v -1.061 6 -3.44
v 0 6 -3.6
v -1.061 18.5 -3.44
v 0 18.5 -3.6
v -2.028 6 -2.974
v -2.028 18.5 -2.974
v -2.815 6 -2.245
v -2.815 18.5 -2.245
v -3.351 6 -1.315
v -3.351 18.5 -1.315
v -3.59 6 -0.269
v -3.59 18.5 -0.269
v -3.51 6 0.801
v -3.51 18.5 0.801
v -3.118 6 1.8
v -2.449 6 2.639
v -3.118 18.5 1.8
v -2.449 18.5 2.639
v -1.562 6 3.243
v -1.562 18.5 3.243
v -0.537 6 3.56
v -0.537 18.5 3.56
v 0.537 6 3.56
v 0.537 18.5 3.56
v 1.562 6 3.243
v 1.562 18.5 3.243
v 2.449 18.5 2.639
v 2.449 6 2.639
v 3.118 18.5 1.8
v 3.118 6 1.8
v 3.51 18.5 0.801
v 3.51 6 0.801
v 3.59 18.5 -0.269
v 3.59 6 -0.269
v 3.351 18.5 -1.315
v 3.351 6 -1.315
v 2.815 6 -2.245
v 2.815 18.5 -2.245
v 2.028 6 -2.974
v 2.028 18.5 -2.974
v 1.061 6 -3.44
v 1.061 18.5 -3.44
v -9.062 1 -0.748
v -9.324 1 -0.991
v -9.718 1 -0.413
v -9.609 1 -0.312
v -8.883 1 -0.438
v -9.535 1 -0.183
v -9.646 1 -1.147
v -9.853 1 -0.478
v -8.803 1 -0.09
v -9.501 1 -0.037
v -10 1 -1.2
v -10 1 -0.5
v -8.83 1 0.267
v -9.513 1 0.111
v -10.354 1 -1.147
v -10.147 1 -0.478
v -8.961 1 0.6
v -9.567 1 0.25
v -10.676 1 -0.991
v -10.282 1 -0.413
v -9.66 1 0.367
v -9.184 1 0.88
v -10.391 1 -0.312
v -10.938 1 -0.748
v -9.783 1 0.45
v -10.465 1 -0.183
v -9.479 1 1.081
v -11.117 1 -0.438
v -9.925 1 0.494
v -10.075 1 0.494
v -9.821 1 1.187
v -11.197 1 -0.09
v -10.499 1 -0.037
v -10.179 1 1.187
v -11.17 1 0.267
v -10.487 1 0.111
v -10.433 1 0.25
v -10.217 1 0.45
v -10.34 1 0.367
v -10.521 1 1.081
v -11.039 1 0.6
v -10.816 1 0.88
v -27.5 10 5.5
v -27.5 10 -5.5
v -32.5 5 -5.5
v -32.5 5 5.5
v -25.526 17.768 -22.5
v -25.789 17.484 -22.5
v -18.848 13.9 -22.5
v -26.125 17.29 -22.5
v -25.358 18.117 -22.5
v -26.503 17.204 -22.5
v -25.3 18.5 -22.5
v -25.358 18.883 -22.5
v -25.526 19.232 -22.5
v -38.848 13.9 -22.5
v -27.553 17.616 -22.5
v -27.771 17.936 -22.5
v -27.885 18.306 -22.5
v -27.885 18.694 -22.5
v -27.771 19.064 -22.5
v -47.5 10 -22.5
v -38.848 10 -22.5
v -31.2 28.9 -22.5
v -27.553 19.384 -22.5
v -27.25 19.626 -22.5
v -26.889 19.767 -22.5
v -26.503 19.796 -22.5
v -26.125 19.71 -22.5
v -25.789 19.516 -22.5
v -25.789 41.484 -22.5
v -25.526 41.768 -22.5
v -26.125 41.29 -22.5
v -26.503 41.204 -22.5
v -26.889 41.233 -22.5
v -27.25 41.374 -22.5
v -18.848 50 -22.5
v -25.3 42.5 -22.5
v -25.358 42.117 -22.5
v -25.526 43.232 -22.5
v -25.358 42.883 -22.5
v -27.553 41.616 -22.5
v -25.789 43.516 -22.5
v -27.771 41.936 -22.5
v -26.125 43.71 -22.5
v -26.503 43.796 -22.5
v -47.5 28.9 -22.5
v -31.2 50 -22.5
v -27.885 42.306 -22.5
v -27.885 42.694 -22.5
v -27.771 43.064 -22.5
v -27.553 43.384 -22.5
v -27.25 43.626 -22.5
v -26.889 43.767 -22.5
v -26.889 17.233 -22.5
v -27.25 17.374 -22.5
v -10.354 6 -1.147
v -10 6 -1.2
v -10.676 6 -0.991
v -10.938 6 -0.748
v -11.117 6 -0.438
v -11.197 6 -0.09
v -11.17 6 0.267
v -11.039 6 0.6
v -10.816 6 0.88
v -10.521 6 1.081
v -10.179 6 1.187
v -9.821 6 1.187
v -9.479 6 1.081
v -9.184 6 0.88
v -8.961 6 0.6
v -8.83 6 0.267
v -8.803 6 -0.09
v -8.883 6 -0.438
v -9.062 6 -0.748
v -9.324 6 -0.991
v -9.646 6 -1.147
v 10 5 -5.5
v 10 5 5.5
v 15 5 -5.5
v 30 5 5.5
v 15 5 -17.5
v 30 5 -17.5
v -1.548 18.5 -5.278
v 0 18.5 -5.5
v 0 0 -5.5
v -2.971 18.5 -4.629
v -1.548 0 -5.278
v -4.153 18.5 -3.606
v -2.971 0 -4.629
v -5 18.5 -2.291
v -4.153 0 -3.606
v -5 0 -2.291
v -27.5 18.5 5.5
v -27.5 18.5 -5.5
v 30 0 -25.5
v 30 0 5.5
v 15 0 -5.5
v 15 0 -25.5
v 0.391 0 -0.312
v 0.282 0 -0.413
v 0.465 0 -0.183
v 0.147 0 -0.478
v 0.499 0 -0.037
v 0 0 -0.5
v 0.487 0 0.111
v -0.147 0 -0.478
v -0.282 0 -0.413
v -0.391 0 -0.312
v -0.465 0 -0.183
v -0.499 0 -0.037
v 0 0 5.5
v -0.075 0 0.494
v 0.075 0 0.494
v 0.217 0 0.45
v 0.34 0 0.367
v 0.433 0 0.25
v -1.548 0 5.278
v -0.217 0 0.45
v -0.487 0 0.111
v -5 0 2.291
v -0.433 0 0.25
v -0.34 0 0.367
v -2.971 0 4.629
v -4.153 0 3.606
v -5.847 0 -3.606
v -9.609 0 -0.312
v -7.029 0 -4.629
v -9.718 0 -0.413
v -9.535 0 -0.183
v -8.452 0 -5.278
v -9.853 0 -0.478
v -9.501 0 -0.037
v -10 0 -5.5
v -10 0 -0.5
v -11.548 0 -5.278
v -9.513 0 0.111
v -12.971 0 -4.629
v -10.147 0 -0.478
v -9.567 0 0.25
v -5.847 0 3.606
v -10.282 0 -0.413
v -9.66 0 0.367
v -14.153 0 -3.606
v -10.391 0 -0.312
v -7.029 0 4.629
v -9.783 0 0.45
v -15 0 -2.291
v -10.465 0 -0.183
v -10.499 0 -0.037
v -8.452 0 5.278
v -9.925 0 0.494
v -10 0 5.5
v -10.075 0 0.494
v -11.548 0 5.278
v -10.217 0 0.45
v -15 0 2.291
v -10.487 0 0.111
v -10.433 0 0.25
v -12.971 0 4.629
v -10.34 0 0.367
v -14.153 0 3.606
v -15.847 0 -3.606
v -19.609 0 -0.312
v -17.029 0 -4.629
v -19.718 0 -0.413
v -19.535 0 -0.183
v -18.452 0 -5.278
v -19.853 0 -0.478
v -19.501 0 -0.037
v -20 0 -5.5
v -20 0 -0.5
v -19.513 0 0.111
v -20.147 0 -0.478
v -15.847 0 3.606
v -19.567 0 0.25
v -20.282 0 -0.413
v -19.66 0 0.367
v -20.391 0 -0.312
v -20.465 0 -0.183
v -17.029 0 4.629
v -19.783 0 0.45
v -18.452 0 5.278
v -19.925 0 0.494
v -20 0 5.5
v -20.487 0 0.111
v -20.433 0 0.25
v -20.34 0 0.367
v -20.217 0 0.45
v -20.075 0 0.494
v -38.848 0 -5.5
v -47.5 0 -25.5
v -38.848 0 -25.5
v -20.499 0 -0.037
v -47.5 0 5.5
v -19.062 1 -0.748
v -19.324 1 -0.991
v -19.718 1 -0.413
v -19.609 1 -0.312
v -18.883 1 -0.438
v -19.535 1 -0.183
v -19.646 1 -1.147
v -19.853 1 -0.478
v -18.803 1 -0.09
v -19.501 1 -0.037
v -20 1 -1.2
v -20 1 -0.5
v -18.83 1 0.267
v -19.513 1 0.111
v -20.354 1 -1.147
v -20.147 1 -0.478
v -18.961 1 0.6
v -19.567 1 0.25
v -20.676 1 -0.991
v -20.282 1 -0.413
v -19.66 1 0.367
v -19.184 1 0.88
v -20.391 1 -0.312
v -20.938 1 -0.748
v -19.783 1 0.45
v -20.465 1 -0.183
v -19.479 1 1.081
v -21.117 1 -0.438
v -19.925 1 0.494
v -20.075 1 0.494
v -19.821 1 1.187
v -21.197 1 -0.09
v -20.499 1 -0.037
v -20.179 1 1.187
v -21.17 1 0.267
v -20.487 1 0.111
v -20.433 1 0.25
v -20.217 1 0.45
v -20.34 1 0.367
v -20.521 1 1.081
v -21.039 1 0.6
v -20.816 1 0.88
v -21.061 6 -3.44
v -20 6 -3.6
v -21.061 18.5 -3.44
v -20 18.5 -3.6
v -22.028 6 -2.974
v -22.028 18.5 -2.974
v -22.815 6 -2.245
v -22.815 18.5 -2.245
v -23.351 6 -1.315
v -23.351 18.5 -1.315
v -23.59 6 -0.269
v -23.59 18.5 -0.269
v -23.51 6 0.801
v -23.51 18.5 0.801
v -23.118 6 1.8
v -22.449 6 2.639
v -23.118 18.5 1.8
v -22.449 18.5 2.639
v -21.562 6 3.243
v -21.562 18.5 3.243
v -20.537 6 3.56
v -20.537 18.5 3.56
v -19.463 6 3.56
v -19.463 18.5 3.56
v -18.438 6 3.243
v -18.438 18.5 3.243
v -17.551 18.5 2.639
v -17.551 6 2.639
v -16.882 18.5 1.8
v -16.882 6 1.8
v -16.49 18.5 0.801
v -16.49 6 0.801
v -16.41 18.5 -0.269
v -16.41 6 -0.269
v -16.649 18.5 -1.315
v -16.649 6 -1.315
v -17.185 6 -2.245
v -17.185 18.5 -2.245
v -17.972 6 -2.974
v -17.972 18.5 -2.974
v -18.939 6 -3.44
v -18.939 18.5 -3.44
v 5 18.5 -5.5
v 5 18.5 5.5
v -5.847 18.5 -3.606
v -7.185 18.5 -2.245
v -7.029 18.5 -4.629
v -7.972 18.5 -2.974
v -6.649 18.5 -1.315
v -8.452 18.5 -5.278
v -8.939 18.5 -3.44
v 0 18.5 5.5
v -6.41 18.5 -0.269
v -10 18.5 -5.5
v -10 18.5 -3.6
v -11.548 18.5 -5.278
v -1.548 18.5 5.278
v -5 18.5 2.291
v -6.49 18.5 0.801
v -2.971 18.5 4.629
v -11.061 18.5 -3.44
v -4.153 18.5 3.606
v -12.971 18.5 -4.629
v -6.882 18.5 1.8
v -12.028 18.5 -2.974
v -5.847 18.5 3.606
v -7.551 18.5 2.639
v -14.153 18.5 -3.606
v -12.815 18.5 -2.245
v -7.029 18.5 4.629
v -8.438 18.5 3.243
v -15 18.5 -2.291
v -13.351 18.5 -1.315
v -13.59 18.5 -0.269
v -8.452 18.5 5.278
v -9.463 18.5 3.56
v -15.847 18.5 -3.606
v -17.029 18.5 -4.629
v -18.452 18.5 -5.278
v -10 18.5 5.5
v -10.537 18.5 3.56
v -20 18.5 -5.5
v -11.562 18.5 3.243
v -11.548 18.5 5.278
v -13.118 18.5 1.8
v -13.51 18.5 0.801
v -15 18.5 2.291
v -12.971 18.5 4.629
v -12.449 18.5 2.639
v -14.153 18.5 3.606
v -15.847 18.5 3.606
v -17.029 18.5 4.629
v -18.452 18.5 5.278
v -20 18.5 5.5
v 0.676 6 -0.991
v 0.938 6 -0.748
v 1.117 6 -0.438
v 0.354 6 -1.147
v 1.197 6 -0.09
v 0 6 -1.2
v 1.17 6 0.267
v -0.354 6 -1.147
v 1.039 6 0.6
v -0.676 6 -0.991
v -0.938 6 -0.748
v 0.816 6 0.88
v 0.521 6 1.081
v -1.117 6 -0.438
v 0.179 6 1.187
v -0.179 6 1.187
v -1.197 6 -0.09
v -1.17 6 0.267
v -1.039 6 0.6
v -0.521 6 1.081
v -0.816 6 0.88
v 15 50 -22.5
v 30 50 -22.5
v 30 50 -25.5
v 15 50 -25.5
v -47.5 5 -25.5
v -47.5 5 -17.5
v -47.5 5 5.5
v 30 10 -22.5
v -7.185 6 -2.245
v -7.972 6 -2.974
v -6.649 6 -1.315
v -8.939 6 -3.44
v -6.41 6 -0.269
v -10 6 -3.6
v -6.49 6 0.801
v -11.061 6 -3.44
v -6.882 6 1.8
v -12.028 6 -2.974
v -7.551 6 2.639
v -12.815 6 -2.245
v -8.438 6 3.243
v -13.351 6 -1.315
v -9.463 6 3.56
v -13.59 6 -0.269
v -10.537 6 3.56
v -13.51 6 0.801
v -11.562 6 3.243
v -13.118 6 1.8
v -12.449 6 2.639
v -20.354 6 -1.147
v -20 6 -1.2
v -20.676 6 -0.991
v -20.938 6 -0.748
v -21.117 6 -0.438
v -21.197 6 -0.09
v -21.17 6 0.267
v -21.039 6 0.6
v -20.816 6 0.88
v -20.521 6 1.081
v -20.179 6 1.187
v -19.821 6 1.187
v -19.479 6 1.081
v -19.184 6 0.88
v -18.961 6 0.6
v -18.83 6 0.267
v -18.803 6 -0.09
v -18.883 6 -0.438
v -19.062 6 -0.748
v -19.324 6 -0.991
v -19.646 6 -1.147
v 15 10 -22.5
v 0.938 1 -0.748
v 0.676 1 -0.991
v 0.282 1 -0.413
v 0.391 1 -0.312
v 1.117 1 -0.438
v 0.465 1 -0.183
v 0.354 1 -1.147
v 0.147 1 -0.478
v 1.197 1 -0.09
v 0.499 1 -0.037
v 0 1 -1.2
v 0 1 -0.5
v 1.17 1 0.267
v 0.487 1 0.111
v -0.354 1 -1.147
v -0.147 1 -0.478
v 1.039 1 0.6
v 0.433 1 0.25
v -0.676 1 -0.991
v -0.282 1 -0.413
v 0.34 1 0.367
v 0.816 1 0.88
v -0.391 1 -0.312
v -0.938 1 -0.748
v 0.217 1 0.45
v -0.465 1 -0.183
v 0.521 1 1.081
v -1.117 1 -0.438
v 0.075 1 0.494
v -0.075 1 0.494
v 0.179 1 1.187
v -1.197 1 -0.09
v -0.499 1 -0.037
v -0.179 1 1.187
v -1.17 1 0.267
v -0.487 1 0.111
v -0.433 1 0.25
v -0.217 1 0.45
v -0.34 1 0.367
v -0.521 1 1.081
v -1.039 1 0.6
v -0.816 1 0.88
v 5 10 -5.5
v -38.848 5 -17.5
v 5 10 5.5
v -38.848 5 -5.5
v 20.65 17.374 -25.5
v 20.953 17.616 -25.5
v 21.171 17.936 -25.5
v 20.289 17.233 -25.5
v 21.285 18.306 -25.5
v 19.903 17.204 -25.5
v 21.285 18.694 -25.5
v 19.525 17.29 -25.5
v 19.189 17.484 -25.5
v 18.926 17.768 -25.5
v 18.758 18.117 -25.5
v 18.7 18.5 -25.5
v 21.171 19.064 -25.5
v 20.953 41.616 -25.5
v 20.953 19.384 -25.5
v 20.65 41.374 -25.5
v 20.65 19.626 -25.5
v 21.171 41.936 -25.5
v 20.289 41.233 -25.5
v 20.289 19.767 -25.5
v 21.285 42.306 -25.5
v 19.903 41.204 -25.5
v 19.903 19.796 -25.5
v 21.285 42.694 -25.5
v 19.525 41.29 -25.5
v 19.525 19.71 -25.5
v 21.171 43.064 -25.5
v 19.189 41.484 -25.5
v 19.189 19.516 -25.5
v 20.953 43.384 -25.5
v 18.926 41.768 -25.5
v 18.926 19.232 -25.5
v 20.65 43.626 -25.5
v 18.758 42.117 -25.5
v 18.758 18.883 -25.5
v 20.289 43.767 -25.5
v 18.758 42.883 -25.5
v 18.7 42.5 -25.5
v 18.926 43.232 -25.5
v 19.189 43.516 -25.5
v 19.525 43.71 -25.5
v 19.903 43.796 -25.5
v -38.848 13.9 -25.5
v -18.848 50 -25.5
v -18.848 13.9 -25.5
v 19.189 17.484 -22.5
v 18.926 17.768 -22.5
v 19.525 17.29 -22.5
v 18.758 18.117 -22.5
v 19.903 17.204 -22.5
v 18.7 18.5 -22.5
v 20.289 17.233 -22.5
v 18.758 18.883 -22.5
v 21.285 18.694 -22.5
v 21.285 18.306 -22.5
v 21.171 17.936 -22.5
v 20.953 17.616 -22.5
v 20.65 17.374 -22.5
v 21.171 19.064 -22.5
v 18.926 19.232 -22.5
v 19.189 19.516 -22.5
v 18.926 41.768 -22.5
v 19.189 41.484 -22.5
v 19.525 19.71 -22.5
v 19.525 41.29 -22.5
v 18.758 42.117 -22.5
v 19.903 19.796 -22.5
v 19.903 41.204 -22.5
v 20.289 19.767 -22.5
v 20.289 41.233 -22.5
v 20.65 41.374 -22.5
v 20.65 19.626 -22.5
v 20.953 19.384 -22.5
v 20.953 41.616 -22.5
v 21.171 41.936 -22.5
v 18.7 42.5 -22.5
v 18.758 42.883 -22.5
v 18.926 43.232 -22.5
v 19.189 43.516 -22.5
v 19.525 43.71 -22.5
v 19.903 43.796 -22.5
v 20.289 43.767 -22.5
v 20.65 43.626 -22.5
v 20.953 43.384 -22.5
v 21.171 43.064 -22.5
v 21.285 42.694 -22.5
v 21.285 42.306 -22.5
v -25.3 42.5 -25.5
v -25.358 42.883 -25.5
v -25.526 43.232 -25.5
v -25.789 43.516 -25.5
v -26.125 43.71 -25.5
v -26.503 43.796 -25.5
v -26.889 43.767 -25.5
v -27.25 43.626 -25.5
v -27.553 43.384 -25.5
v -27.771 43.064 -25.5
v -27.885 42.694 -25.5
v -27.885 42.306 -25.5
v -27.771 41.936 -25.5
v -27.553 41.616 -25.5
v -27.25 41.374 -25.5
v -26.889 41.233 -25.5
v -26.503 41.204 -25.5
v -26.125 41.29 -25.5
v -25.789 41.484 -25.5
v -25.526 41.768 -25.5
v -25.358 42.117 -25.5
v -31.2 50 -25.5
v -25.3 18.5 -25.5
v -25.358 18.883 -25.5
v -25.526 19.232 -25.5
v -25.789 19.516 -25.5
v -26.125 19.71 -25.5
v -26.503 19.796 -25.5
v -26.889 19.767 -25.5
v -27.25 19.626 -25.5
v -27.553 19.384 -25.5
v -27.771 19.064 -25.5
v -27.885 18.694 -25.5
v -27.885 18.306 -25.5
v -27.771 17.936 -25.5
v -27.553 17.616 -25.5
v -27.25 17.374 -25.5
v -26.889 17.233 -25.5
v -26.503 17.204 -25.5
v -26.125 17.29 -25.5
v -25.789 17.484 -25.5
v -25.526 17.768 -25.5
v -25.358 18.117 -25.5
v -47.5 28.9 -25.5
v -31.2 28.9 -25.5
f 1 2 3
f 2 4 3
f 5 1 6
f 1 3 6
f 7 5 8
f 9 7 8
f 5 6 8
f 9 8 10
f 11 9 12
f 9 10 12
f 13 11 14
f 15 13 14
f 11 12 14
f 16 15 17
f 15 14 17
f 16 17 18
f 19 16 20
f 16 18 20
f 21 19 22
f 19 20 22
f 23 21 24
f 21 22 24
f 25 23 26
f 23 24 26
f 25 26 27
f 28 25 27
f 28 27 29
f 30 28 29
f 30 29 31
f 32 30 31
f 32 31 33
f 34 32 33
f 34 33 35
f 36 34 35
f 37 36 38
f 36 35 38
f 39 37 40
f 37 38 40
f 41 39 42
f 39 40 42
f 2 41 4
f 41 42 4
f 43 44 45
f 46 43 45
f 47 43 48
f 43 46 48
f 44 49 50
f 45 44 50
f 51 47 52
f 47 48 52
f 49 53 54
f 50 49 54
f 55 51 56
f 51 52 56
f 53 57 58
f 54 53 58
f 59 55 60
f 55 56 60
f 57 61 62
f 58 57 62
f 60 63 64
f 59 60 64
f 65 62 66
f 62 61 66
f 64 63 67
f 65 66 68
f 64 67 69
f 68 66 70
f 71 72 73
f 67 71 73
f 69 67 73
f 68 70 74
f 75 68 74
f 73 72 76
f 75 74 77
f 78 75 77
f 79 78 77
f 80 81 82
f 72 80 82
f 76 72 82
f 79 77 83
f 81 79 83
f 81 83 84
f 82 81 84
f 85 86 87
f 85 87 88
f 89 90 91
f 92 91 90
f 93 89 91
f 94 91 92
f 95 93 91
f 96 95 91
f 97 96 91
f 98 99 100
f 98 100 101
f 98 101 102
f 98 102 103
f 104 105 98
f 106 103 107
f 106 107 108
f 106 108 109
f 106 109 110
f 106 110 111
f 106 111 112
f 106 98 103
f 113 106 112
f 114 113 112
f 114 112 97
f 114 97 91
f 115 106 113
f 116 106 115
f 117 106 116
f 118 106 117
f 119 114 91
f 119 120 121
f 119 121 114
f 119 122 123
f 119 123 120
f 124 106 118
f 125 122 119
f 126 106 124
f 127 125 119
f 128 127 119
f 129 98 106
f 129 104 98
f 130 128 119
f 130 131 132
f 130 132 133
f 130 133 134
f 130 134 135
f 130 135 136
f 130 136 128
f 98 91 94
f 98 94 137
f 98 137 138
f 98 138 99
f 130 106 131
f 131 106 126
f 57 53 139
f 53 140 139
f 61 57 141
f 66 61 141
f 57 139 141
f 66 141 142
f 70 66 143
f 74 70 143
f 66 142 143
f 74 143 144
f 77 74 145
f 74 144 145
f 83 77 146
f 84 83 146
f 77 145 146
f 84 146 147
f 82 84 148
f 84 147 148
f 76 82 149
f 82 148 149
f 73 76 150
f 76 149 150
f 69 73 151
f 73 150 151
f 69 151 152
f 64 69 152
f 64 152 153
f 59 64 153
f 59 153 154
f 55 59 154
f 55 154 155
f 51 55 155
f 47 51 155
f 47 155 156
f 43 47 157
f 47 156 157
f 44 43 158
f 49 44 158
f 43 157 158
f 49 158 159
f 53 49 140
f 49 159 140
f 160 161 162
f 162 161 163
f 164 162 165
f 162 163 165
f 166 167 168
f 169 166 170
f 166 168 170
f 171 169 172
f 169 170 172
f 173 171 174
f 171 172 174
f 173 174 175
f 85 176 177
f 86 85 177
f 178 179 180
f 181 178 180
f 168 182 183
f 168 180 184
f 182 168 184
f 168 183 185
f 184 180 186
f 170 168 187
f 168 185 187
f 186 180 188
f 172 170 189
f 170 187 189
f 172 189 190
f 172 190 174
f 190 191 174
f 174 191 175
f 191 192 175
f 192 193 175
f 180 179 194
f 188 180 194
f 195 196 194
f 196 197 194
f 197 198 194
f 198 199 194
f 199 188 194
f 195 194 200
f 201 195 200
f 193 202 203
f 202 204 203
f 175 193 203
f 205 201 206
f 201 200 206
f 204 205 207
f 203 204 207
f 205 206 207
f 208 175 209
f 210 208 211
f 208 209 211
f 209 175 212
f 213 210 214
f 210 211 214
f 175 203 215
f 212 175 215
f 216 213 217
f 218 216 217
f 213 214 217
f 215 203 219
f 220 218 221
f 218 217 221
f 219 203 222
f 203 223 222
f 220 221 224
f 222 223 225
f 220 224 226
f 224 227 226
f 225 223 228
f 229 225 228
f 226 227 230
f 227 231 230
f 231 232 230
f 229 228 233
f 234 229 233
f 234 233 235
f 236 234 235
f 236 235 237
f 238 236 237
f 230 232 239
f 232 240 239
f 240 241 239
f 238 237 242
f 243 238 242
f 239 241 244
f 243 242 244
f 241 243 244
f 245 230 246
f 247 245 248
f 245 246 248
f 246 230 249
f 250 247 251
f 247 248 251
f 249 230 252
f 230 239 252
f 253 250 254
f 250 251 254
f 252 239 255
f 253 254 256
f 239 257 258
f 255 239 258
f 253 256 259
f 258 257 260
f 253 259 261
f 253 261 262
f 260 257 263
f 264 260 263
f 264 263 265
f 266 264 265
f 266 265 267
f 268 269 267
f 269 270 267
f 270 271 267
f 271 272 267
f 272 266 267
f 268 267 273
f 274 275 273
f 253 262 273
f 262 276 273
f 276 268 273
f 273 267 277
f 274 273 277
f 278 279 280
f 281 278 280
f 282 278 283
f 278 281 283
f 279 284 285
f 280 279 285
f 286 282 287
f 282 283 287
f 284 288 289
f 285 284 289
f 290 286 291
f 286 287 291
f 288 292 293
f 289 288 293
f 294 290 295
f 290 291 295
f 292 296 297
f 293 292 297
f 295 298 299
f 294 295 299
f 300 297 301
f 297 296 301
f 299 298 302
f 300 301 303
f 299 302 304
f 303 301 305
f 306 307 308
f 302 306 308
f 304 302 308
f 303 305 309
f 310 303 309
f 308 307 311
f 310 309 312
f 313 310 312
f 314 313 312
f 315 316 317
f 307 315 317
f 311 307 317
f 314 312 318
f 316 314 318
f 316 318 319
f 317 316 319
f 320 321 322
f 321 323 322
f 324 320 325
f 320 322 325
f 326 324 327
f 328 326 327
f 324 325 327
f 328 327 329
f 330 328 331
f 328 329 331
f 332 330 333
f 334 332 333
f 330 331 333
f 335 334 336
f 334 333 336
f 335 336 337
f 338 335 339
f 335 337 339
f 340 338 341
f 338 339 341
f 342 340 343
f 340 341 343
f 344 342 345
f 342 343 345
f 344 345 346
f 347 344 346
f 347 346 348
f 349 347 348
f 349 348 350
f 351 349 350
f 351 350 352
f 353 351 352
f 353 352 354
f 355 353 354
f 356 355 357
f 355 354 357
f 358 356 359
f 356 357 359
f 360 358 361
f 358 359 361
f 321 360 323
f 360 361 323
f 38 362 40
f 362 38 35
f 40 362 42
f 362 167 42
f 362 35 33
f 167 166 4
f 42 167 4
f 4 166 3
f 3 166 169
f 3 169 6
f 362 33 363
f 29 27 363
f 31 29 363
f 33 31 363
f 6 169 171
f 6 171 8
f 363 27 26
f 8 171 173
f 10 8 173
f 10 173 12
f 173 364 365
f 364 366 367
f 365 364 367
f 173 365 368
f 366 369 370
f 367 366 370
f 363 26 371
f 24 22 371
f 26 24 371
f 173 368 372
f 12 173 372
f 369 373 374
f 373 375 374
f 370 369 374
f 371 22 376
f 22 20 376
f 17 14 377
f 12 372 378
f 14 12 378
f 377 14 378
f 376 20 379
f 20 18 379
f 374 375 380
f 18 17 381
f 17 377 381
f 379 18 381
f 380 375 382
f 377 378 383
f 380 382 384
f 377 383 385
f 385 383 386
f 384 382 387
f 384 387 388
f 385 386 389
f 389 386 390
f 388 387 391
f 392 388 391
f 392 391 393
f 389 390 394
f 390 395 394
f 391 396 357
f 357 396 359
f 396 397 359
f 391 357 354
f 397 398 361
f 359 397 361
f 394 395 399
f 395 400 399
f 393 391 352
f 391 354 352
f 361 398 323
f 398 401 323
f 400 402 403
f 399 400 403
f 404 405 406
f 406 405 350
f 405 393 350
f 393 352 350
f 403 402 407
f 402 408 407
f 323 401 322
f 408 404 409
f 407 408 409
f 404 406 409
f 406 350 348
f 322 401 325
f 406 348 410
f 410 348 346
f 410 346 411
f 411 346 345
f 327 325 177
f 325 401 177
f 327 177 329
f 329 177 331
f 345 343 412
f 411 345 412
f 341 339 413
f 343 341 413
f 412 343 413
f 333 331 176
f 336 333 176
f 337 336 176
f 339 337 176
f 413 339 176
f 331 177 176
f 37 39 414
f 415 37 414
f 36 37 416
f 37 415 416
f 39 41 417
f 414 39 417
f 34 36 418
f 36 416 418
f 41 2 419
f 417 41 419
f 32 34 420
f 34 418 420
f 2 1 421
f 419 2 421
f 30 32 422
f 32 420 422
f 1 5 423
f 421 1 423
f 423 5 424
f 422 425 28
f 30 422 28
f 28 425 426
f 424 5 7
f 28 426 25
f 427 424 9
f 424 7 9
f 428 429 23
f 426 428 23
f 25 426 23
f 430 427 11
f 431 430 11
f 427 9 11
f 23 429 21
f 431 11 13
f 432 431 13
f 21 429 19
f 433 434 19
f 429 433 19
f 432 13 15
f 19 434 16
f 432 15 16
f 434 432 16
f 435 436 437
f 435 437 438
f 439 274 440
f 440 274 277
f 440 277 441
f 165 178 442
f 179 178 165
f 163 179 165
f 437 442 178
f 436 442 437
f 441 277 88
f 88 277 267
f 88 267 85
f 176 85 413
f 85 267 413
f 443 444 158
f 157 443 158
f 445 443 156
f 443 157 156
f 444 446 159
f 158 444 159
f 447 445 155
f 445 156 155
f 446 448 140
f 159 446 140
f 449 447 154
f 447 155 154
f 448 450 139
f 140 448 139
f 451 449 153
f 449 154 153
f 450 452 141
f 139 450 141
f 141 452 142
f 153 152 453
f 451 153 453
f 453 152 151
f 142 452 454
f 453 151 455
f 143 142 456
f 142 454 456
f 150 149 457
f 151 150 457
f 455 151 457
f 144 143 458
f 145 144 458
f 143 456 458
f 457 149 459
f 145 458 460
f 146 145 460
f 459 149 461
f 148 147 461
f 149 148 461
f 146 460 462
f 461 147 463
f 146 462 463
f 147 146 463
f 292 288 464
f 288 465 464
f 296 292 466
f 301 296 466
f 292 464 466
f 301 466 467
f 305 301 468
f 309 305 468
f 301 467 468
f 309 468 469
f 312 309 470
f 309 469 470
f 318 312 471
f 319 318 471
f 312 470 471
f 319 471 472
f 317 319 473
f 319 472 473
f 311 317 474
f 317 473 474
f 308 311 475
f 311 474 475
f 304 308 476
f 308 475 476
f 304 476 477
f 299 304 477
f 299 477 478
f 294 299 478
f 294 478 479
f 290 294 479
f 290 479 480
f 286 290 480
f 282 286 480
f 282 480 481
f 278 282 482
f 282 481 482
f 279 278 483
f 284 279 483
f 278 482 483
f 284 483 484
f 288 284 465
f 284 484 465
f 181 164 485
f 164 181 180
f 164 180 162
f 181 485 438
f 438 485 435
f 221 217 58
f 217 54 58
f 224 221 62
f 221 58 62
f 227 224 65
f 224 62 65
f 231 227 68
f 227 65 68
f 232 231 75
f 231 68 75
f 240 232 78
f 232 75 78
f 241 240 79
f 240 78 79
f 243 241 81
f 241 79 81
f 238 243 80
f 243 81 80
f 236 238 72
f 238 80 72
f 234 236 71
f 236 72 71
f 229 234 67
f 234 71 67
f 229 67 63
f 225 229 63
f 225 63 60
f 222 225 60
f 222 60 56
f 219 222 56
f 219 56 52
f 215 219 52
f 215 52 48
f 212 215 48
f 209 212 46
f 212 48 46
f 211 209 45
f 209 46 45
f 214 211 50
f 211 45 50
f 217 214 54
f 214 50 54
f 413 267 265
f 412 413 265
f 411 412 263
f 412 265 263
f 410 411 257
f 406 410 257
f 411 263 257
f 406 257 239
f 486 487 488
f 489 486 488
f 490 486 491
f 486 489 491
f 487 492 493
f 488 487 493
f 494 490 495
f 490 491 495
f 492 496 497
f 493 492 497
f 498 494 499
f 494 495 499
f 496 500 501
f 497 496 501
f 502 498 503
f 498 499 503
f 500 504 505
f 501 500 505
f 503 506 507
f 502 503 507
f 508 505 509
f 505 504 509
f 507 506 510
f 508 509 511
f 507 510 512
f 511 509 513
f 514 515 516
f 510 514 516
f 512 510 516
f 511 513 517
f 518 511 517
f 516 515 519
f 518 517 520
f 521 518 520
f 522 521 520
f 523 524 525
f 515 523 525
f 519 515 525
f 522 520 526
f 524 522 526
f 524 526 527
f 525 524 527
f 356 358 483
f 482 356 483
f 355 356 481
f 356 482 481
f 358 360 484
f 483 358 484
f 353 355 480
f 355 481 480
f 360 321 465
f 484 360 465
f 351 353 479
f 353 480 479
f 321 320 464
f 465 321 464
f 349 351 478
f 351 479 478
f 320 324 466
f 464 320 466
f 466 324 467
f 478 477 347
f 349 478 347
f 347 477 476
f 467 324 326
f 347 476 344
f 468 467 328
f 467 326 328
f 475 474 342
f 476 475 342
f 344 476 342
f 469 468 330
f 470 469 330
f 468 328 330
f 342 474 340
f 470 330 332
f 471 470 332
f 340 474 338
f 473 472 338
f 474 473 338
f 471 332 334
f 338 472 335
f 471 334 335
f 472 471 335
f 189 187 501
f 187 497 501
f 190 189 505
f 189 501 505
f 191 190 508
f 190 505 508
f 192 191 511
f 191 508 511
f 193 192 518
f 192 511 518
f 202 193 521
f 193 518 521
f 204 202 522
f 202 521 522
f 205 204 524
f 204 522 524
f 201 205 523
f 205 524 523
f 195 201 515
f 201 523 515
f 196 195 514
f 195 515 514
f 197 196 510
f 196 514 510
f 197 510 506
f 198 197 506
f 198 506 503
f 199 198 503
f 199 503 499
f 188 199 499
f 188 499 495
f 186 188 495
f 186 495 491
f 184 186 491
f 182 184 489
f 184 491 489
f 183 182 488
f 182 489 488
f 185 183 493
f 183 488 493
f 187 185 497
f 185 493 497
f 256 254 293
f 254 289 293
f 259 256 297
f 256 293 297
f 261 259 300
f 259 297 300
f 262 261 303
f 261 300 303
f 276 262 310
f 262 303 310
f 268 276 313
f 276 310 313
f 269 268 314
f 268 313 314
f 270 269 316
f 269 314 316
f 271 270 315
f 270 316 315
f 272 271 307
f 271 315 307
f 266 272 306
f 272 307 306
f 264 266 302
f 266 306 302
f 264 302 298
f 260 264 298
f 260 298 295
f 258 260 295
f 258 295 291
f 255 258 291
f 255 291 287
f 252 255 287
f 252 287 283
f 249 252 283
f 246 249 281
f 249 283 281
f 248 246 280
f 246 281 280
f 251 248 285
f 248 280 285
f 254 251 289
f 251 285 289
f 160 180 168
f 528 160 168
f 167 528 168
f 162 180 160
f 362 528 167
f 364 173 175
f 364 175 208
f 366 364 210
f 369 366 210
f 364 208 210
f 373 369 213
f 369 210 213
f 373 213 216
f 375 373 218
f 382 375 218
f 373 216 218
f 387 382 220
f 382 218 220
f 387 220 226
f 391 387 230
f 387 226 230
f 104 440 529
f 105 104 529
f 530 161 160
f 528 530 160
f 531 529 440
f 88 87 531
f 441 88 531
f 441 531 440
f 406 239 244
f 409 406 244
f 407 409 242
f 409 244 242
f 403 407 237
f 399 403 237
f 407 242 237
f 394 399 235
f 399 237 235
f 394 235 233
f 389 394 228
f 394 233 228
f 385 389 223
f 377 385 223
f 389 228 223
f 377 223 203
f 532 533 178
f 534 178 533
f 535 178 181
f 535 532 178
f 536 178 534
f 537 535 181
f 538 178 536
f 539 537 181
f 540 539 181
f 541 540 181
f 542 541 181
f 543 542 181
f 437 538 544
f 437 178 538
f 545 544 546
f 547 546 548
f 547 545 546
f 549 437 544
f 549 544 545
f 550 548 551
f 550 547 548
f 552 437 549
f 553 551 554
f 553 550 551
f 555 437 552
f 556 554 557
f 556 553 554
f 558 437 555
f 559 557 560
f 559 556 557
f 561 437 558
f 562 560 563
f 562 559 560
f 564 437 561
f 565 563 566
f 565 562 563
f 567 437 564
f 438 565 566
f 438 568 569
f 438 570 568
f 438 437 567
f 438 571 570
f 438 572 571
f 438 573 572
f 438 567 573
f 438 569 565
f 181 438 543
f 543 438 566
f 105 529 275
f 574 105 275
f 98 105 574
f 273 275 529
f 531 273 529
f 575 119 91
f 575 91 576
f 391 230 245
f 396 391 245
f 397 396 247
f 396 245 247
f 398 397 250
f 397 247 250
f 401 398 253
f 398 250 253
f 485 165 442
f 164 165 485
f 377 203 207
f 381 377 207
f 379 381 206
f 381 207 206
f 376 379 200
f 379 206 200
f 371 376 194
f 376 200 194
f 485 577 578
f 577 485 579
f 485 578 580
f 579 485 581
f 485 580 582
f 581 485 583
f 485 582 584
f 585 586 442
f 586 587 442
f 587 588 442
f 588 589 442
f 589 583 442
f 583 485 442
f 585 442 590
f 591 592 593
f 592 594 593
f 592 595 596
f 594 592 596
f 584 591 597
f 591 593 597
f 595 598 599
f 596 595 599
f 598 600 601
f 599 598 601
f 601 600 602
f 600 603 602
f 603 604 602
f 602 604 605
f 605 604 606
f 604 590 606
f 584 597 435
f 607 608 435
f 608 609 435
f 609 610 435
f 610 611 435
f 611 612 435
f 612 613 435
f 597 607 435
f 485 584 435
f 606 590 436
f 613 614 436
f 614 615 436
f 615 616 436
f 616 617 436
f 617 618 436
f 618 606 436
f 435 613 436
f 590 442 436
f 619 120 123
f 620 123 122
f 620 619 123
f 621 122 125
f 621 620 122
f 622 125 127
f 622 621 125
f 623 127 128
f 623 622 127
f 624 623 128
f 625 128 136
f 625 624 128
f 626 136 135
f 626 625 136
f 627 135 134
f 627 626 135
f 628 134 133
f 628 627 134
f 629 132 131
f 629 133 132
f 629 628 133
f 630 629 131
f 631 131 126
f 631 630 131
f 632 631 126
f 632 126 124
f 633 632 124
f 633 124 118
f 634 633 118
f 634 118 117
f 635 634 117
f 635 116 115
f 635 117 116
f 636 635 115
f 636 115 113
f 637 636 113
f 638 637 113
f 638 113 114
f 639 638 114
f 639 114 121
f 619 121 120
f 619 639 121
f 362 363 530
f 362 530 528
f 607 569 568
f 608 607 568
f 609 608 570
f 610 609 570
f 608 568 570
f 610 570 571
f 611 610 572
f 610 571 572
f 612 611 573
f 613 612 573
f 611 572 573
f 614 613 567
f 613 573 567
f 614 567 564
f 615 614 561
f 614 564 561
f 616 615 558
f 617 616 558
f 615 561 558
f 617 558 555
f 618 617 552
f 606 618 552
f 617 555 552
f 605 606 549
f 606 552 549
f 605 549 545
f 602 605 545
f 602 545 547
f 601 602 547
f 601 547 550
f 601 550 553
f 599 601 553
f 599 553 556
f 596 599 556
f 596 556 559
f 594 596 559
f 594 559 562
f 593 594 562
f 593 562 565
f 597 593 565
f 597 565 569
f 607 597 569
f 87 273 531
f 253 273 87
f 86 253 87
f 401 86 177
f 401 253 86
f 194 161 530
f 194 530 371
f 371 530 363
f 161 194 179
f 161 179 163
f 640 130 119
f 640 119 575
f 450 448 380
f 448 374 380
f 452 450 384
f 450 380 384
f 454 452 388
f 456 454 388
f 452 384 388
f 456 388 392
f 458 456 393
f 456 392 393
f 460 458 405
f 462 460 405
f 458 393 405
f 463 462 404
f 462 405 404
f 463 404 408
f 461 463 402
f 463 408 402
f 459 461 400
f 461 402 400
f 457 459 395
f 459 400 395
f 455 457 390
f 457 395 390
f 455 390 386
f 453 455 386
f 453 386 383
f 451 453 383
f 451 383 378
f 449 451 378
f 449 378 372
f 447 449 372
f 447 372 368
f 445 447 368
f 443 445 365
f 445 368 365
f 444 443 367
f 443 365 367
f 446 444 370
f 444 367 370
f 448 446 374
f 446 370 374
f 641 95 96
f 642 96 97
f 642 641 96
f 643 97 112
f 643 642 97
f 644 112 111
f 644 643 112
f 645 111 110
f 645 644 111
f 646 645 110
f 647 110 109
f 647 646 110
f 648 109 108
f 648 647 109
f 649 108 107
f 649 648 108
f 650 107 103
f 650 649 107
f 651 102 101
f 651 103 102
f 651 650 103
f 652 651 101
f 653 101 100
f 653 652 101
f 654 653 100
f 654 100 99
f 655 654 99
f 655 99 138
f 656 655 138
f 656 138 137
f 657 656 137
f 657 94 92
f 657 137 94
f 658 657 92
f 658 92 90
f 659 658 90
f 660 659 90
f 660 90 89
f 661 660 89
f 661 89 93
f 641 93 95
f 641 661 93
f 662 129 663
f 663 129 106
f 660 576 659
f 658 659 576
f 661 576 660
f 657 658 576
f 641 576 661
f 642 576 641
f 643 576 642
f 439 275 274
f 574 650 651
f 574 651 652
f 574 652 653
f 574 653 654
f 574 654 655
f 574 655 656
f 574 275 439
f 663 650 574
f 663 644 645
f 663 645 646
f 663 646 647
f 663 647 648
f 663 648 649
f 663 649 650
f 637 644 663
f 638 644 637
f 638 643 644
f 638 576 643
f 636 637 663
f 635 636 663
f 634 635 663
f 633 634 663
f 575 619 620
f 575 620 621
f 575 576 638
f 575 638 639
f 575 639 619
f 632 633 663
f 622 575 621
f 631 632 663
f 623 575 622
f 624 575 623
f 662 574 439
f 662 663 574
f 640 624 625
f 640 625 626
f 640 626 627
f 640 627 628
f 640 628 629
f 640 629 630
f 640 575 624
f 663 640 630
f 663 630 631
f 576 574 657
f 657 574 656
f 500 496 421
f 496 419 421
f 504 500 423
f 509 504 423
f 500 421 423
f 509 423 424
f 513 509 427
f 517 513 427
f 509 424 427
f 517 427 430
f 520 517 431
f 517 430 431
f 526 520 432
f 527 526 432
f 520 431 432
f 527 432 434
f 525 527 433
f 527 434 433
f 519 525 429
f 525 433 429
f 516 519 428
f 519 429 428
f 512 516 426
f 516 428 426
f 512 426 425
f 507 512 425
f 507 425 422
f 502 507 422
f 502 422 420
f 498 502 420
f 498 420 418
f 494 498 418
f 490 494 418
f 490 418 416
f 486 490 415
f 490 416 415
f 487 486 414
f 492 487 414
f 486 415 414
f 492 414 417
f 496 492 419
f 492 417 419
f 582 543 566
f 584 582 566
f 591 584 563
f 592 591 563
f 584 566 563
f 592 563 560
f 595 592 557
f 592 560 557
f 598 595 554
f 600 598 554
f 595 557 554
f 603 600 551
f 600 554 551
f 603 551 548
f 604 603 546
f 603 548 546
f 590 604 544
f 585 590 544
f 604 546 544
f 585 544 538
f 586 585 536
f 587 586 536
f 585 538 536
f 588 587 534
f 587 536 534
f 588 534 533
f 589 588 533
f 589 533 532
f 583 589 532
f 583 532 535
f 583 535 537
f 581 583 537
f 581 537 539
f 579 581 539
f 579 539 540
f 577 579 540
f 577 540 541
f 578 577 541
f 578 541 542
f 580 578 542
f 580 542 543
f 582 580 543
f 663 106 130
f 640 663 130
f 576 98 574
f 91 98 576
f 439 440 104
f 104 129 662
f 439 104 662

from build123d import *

# Parameters (mm, degrees)
BOSS_EXTRUDE1_REACH      = 42.407
BOSS_EXTRUDE1_END_RADIUS = 5.5
SKETCH3_W                = 11
SKETCH3_H                = 18.5
SKETCH4_W                = 15
SKETCH4_H                = 50
BOSS_EXTRUDE2_DEPTH      = 20
SKETCH6_W                = 29.427394299
SKETCH6_H                = 67.669990189
CUT_EXTRUDE1_DEPTH       = 25
SKETCH5_R                = 1.3
CUT_EXTRUDE3_DEPTH       = 10
LPATTERN3_COUNT          = 3
LPATTERN3_PITCH          = 10
BOSS_EXTRUDE3_REACH      = 82.352
BOSS_EXTRUDE3_END_RADIUS = 5.5
SKETCH8_W                = 11
SKETCH8_H                = 18.5
SKETCH10_W               = 11
SKETCH10_H               = 5
BOSS_EXTRUDE4_DEPTH      = 20
SKETCH11_W               = 8.652195312
SKETCH11_H               = 5
BOSS_EXTRUDE5_DEPTH      = 20
BOSS_EXTRUDE6_DEPTH      = 20
BOSS_EXTRUDE6_DEPTH_BACK = 8.652195
SKETCH12_W               = 3
SKETCH12_H               = 50
SKETCH14_W               = 20
SKETCH14_H               = 13.9
SKETCH14_W_2             = 16.3
SKETCH14_H_2             = 21.1
CUT_EXTRUDE5_DEPTH       = 10
CHAMFER2_SIZE            = 5


with BuildPart() as part:
    # Sketch1 → Revolve1 (revolve)
    with BuildSketch(Plane.XY, mode=Mode.PRIVATE) as revolve1_sk:
        Polygon((3.6, 18.5), (5.5, 18.5), (5.5, 0), (0.5, 0), (0.5, 1), (1.2, 1), (1.2, 6), (3.6, 6), align=None)
    revolve1 = revolve(revolve1_sk.sketch.rotate(Axis((0, 0, 0), (0, 1, 0)), 90), axis=Axis((0, 0, 0), (0, 1, 0)))

    # Boss-Extrude1: up to this cylinder (the profile starts outside it)
    boss_extrude1_end = Plane(origin=(0, 9.25, 0), z_dir=(0, -1, 0)) * Cylinder(BOSS_EXTRUDE1_END_RADIUS, 96.814, mode=Mode.PRIVATE)
    # Sketch3 → Boss-Extrude1 (add, up to the surface)
    with BuildSketch(Plane(origin=(30, 0, 0), x_dir=(0, 0, -1), z_dir=(1, 0, 0)), mode=Mode.PRIVATE) as boss_extrude1_sk1:
        with Locations((0, 9.25)):
            Rectangle(SKETCH3_W, SKETCH3_H)
    boss_extrude1_tool1 = extrude(boss_extrude1_sk1.sketch, amount=-BOSS_EXTRUDE1_REACH, mode=Mode.PRIVATE) - boss_extrude1_end
    add(boss_extrude1_tool1.solids().sort_by_distance((30, 9.25, 0))[0])

    # Sketch4 → Boss-Extrude2 (add)
    with BuildSketch(Plane(origin=(0, 0, -5.5), x_dir=(-1, 0, 0), z_dir=(0, 0, -1))):
        with Locations((-22.5, 25)):
            Rectangle(SKETCH4_W, SKETCH4_H)
    extrude(amount=BOSS_EXTRUDE2_DEPTH)

    # Sketch6 → Cut-Extrude1 (cut)
    with BuildSketch(Plane(origin=(30, 0, 0), x_dir=(0, 0, -1), z_dir=(1, 0, 0))):
        with Locations((7.786302851, 38.834995095)):
            Rectangle(SKETCH6_W, SKETCH6_H)
    extrude(amount=-CUT_EXTRUDE1_DEPTH, mode=Mode.SUBTRACT)

    # Sketch5 → Cut-Extrude3 (cut)
    with BuildSketch(Plane(origin=(0, 0, -25.5), x_dir=(-1, 0, 0), z_dir=(0, 0, -1))):
        with Locations((-20, 42.5)):
            Circle(SKETCH5_R)
        with Locations((-20, 18.5)):
            Circle(SKETCH5_R)
    cut_extrude3 = extrude(amount=-CUT_EXTRUDE3_DEPTH, mode=Mode.SUBTRACT)

    # LPattern3: Revolve1 ×3
    with Locations(*[(-i * LPATTERN3_PITCH, 0, 0) for i in range(1, LPATTERN3_COUNT)]):
        add(revolve1)

    # Boss-Extrude3: up to this cylinder (the profile starts outside it)
    boss_extrude3_end = Plane(origin=(-20, 9.25, 0), z_dir=(0, -1, 0)) * Cylinder(BOSS_EXTRUDE3_END_RADIUS, 176.704, mode=Mode.PRIVATE)
    # Sketch8 → Boss-Extrude3 (add, up to the surface)
    with BuildSketch(Plane(origin=(-27.5, 0, 0), x_dir=(0, 0, -1), z_dir=(1, 0, 0)), mode=Mode.PRIVATE) as boss_extrude3_sk1:
        with Locations((0, 9.25)):
            Rectangle(SKETCH8_W, SKETCH8_H)
    boss_extrude3_tool1 = extrude(boss_extrude3_sk1.sketch, amount=BOSS_EXTRUDE3_REACH, mode=Mode.PRIVATE) - boss_extrude3_end
    add(boss_extrude3_tool1.solids().sort_by_distance((-27.5, 9.25, 0))[0])

    # Sketch10 → Boss-Extrude4 (add)
    with BuildSketch(Plane.ZY.offset(27.5)):
        with Locations((0, 2.5)):
            Rectangle(SKETCH10_W, SKETCH10_H)
    extrude(amount=BOSS_EXTRUDE4_DEPTH)

    # Sketch11 → Boss-Extrude5 (add)
    with BuildSketch(Plane(origin=(0, 0, -5.5), x_dir=(-1, 0, 0), z_dir=(0, 0, -1))):
        with Locations((43.173902344, 2.5)):
            Rectangle(SKETCH11_W, SKETCH11_H)
    extrude(amount=BOSS_EXTRUDE5_DEPTH)

    # Sketch12 → Boss-Extrude6 (add, two sides: drawn at the far end of the back side and taken through both)
    with BuildSketch(Plane(origin=(-38.847804688, 0, 0), x_dir=(0, 0, -1), z_dir=(1, 0, 0)).offset(-BOSS_EXTRUDE6_DEPTH_BACK)):
        with Locations((24, 25)):
            Rectangle(SKETCH12_W, SKETCH12_H)
    extrude(amount=BOSS_EXTRUDE6_DEPTH + BOSS_EXTRUDE6_DEPTH_BACK)

    # Mirror1: Cut-Extrude3 across plane
    add(cut_extrude3.mirror(Plane.ZY.offset(3.3)), mode=Mode.SUBTRACT)

    # Sketch14 → Cut-Extrude5 (cut)
    with BuildSketch(Plane.XY.offset(-22.5)):
        with Locations((-28.847804688, 6.95)):
            Rectangle(SKETCH14_W, SKETCH14_H)
        with Locations((-39.35, 39.45)):
            Rectangle(SKETCH14_W_2, SKETCH14_H_2)
    extrude(amount=-CUT_EXTRUDE5_DEPTH, mode=Mode.SUBTRACT)

    # Chamfer2
    chamfer2_edges = [part.edges().sort_by_distance(p)[0] for p in [
        (-27.5, 5, 0),
        (-43.173902188, 5, -22.5),
        (5, 5, 0),
        (22.5, 5, -22.5),
    ]]
    chamfer(chamfer2_edges, length=CHAMFER2_SIZE)


solid = part.part
